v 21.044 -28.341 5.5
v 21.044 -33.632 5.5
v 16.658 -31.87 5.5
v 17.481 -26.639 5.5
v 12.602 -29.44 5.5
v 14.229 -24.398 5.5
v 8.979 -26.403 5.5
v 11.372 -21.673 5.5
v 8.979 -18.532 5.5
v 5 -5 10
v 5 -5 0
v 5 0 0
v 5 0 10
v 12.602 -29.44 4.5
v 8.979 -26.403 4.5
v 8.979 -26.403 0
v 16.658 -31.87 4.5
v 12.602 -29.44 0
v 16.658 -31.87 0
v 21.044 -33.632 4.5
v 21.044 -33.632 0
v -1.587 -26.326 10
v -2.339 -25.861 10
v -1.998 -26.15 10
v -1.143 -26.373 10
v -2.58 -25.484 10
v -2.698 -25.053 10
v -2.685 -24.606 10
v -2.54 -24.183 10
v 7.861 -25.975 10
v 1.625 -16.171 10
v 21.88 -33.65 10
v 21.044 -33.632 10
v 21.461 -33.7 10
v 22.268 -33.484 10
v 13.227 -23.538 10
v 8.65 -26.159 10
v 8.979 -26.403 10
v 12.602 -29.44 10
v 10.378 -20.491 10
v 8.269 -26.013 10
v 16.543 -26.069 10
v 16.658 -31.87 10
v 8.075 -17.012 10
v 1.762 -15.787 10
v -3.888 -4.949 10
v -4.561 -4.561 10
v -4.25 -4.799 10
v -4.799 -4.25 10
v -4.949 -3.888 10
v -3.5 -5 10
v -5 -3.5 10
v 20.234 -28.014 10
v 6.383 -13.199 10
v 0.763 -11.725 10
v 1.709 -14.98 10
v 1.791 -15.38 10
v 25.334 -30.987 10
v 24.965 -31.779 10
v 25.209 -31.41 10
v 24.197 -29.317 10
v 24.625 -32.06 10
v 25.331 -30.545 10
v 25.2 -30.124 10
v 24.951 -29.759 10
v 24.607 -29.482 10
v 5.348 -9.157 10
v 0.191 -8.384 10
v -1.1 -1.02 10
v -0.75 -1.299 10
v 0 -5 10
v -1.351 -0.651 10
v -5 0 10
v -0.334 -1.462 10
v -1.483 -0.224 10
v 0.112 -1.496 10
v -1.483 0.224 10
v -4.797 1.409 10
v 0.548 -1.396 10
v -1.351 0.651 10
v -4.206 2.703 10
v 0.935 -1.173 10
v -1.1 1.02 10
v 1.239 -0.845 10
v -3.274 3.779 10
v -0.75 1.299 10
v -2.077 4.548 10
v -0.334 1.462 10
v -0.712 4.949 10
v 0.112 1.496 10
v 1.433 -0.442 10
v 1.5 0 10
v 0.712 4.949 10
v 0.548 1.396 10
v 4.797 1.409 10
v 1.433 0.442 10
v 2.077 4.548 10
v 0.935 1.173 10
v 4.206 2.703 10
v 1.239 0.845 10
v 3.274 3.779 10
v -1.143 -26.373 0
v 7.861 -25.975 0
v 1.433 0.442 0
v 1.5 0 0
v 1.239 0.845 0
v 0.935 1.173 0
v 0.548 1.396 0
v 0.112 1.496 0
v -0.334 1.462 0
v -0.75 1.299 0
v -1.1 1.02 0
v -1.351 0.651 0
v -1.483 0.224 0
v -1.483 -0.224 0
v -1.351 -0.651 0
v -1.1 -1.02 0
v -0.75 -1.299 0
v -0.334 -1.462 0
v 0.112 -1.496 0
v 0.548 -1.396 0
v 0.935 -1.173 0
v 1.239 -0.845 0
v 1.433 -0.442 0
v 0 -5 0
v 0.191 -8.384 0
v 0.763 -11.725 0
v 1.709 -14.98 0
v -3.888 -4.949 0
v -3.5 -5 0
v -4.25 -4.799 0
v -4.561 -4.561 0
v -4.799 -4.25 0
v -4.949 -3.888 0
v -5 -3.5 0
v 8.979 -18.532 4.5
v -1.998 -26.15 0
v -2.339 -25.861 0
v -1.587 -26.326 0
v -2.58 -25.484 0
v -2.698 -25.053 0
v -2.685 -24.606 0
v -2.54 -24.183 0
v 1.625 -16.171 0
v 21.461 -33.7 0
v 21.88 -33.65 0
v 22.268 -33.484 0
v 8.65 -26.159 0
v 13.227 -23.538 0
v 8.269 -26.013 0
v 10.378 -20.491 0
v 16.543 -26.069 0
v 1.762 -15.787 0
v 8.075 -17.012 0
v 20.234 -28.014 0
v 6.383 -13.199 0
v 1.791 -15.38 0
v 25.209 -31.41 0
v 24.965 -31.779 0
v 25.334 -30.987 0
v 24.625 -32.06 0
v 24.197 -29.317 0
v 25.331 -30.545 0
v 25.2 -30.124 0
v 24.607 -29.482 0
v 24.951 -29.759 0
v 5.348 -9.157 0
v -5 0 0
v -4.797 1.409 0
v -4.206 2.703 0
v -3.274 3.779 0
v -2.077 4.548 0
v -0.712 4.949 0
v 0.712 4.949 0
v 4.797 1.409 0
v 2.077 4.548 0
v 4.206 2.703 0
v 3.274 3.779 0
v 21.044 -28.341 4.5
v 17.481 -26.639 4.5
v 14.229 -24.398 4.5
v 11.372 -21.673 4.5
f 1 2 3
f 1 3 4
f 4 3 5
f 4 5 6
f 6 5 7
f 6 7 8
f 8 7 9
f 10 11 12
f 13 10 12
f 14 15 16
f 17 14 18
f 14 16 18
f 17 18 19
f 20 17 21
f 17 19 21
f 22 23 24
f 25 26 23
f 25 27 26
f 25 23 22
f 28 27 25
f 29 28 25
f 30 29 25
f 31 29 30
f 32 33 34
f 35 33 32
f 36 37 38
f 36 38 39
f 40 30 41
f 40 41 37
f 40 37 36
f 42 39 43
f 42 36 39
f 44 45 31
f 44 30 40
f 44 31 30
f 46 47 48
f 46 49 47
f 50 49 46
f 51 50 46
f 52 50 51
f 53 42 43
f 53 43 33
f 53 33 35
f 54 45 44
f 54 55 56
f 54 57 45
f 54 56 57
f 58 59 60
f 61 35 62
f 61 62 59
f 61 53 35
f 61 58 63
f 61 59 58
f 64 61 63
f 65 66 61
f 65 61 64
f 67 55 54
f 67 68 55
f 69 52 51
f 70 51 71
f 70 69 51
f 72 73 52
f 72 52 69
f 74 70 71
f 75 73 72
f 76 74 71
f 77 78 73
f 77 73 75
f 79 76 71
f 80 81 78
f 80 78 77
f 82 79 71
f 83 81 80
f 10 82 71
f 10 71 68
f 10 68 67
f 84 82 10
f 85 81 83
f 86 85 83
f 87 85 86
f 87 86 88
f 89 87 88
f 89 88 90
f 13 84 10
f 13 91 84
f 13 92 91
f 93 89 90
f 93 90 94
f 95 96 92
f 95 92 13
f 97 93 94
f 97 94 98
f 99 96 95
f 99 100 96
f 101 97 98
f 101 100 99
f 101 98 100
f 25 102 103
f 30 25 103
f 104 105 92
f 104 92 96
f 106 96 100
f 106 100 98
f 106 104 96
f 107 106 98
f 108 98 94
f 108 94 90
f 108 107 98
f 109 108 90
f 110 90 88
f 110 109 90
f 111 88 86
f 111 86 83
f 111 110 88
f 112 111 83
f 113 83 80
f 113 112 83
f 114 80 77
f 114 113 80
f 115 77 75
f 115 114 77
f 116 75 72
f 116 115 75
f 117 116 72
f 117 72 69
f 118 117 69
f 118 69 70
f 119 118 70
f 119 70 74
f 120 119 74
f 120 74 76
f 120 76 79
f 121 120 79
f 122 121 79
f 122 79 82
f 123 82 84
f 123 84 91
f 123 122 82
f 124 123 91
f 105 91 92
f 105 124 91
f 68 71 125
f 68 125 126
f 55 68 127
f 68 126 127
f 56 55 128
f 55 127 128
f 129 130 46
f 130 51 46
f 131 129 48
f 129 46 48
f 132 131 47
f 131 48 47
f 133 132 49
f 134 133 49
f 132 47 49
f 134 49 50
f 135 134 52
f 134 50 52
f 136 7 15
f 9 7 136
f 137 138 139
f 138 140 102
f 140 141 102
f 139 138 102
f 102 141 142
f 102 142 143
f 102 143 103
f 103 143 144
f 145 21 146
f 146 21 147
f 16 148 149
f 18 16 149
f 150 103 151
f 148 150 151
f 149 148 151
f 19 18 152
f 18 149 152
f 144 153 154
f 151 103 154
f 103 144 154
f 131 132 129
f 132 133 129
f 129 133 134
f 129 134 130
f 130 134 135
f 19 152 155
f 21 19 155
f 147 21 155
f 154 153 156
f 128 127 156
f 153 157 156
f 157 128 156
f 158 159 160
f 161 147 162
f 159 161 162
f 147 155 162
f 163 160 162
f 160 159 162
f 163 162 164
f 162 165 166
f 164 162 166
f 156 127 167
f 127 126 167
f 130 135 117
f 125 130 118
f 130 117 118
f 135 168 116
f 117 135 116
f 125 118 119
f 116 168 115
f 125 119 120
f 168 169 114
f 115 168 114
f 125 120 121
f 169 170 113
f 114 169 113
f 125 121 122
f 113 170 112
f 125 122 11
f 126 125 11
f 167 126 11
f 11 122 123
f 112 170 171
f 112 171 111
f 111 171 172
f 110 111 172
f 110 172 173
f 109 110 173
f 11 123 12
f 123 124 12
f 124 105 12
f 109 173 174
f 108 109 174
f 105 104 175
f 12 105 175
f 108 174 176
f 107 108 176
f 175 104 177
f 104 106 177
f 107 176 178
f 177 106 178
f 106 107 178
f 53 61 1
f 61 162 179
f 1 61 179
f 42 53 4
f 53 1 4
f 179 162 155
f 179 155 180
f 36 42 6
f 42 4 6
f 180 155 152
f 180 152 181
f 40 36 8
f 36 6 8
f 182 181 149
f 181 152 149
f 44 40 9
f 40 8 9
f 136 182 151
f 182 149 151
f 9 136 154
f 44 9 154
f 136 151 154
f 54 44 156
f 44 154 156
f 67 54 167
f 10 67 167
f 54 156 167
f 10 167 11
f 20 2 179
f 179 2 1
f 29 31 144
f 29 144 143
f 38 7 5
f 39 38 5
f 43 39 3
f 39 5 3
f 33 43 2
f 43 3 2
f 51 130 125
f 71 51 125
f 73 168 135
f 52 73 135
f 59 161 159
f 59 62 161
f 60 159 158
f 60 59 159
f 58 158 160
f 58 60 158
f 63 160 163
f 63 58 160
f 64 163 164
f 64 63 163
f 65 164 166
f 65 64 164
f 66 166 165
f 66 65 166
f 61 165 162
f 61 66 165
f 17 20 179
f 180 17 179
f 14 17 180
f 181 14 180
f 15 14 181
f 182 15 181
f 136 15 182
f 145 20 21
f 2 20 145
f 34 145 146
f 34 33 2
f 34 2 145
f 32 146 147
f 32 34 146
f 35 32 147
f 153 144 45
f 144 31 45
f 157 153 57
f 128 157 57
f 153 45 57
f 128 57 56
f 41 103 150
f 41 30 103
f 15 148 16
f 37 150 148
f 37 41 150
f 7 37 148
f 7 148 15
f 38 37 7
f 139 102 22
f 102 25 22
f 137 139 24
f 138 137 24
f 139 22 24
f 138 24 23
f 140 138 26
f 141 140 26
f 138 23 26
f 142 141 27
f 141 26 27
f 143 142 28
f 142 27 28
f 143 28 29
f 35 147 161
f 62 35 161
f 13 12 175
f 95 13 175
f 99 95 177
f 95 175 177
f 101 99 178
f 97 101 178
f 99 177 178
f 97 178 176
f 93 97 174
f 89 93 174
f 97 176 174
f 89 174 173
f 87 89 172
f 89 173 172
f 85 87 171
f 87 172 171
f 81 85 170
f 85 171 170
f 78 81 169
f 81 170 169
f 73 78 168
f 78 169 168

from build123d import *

# Parameters (mm, degrees)
SKETCH_2_R              = 1.5
EXTRUDE_1_DEPTH         = 10
FILLET_1_R              = 1.5
CUT_EXTRUDE_START       = 8.978636738
CUT_EXTRUDE_6_OUTLINE_W = 18
CUT_EXTRUDE_6_OUTLINE_H = 1
CUT_EXTRUDE_6_DEPTH     = 12.065744551


# Read off the part's stored shape, not the designer's step: 切除-拉伸6
with BuildPart() as part:
    # 草图2 → 凸台-拉伸1 (new body)
    with BuildSketch(Plane.XY):
        with BuildLine():
            Line((-3.738313135, -26.487804482), (8.522639585, -25.945713856))
            ThreePointArc((8.522639585, -25.945713856), (14.597644225, -30.744268797), (21.698305683, -33.828489568))
            Line((21.698305683, -33.828489568), (28.148131868, -29.931317342))
            ThreePointArc((28.148131868, -29.931317342), (11.679291726, -22.010339454), (5, -5))
            Line((5, -5), (5, 0))
            ThreePointArc((5, 0), (0, 5), (-5, 0))
            Line((-5, 0), (-5, -5))
            Line((-5, -5), (1.011e-06, -5))
            ThreePointArc((1.011e-06, -5), (0.486326168, -10.379869542), (1.929534162, -15.585314685))
            Line((1.929534162, -15.585314685), (-3.738313135, -26.487804482))
        make_face()
        Circle(SKETCH_2_R, mode=Mode.SUBTRACT)
    extrude(amount=EXTRUDE_1_DEPTH)

    # 圆角1
    fillet_1_edges = [part.edges().sort_by_distance(p)[0] for p in [
        (-3.738313135, -26.487804482, 5),
        (1.929534162, -15.585314685, 5),
        (-5, -5, 5),
        (28.148131868, -29.931317342, 5),
        (21.698305683, -33.828489568, 5),
        (8.522639585, -25.945713856, 5),
    ]]
    fillet(fillet_1_edges, radius=FILLET_1_R)

    # 切除-拉伸6 outline → 切除-拉伸6 (cut)
    with BuildSketch(Plane.YZ.offset(CUT_EXTRUDE_START)):
        with Locations((-26, 5)):
            Rectangle(CUT_EXTRUDE_6_OUTLINE_W, CUT_EXTRUDE_6_OUTLINE_H)
    extrude(amount=CUT_EXTRUDE_6_DEPTH, mode=Mode.SUBTRACT)


solid = part.part
